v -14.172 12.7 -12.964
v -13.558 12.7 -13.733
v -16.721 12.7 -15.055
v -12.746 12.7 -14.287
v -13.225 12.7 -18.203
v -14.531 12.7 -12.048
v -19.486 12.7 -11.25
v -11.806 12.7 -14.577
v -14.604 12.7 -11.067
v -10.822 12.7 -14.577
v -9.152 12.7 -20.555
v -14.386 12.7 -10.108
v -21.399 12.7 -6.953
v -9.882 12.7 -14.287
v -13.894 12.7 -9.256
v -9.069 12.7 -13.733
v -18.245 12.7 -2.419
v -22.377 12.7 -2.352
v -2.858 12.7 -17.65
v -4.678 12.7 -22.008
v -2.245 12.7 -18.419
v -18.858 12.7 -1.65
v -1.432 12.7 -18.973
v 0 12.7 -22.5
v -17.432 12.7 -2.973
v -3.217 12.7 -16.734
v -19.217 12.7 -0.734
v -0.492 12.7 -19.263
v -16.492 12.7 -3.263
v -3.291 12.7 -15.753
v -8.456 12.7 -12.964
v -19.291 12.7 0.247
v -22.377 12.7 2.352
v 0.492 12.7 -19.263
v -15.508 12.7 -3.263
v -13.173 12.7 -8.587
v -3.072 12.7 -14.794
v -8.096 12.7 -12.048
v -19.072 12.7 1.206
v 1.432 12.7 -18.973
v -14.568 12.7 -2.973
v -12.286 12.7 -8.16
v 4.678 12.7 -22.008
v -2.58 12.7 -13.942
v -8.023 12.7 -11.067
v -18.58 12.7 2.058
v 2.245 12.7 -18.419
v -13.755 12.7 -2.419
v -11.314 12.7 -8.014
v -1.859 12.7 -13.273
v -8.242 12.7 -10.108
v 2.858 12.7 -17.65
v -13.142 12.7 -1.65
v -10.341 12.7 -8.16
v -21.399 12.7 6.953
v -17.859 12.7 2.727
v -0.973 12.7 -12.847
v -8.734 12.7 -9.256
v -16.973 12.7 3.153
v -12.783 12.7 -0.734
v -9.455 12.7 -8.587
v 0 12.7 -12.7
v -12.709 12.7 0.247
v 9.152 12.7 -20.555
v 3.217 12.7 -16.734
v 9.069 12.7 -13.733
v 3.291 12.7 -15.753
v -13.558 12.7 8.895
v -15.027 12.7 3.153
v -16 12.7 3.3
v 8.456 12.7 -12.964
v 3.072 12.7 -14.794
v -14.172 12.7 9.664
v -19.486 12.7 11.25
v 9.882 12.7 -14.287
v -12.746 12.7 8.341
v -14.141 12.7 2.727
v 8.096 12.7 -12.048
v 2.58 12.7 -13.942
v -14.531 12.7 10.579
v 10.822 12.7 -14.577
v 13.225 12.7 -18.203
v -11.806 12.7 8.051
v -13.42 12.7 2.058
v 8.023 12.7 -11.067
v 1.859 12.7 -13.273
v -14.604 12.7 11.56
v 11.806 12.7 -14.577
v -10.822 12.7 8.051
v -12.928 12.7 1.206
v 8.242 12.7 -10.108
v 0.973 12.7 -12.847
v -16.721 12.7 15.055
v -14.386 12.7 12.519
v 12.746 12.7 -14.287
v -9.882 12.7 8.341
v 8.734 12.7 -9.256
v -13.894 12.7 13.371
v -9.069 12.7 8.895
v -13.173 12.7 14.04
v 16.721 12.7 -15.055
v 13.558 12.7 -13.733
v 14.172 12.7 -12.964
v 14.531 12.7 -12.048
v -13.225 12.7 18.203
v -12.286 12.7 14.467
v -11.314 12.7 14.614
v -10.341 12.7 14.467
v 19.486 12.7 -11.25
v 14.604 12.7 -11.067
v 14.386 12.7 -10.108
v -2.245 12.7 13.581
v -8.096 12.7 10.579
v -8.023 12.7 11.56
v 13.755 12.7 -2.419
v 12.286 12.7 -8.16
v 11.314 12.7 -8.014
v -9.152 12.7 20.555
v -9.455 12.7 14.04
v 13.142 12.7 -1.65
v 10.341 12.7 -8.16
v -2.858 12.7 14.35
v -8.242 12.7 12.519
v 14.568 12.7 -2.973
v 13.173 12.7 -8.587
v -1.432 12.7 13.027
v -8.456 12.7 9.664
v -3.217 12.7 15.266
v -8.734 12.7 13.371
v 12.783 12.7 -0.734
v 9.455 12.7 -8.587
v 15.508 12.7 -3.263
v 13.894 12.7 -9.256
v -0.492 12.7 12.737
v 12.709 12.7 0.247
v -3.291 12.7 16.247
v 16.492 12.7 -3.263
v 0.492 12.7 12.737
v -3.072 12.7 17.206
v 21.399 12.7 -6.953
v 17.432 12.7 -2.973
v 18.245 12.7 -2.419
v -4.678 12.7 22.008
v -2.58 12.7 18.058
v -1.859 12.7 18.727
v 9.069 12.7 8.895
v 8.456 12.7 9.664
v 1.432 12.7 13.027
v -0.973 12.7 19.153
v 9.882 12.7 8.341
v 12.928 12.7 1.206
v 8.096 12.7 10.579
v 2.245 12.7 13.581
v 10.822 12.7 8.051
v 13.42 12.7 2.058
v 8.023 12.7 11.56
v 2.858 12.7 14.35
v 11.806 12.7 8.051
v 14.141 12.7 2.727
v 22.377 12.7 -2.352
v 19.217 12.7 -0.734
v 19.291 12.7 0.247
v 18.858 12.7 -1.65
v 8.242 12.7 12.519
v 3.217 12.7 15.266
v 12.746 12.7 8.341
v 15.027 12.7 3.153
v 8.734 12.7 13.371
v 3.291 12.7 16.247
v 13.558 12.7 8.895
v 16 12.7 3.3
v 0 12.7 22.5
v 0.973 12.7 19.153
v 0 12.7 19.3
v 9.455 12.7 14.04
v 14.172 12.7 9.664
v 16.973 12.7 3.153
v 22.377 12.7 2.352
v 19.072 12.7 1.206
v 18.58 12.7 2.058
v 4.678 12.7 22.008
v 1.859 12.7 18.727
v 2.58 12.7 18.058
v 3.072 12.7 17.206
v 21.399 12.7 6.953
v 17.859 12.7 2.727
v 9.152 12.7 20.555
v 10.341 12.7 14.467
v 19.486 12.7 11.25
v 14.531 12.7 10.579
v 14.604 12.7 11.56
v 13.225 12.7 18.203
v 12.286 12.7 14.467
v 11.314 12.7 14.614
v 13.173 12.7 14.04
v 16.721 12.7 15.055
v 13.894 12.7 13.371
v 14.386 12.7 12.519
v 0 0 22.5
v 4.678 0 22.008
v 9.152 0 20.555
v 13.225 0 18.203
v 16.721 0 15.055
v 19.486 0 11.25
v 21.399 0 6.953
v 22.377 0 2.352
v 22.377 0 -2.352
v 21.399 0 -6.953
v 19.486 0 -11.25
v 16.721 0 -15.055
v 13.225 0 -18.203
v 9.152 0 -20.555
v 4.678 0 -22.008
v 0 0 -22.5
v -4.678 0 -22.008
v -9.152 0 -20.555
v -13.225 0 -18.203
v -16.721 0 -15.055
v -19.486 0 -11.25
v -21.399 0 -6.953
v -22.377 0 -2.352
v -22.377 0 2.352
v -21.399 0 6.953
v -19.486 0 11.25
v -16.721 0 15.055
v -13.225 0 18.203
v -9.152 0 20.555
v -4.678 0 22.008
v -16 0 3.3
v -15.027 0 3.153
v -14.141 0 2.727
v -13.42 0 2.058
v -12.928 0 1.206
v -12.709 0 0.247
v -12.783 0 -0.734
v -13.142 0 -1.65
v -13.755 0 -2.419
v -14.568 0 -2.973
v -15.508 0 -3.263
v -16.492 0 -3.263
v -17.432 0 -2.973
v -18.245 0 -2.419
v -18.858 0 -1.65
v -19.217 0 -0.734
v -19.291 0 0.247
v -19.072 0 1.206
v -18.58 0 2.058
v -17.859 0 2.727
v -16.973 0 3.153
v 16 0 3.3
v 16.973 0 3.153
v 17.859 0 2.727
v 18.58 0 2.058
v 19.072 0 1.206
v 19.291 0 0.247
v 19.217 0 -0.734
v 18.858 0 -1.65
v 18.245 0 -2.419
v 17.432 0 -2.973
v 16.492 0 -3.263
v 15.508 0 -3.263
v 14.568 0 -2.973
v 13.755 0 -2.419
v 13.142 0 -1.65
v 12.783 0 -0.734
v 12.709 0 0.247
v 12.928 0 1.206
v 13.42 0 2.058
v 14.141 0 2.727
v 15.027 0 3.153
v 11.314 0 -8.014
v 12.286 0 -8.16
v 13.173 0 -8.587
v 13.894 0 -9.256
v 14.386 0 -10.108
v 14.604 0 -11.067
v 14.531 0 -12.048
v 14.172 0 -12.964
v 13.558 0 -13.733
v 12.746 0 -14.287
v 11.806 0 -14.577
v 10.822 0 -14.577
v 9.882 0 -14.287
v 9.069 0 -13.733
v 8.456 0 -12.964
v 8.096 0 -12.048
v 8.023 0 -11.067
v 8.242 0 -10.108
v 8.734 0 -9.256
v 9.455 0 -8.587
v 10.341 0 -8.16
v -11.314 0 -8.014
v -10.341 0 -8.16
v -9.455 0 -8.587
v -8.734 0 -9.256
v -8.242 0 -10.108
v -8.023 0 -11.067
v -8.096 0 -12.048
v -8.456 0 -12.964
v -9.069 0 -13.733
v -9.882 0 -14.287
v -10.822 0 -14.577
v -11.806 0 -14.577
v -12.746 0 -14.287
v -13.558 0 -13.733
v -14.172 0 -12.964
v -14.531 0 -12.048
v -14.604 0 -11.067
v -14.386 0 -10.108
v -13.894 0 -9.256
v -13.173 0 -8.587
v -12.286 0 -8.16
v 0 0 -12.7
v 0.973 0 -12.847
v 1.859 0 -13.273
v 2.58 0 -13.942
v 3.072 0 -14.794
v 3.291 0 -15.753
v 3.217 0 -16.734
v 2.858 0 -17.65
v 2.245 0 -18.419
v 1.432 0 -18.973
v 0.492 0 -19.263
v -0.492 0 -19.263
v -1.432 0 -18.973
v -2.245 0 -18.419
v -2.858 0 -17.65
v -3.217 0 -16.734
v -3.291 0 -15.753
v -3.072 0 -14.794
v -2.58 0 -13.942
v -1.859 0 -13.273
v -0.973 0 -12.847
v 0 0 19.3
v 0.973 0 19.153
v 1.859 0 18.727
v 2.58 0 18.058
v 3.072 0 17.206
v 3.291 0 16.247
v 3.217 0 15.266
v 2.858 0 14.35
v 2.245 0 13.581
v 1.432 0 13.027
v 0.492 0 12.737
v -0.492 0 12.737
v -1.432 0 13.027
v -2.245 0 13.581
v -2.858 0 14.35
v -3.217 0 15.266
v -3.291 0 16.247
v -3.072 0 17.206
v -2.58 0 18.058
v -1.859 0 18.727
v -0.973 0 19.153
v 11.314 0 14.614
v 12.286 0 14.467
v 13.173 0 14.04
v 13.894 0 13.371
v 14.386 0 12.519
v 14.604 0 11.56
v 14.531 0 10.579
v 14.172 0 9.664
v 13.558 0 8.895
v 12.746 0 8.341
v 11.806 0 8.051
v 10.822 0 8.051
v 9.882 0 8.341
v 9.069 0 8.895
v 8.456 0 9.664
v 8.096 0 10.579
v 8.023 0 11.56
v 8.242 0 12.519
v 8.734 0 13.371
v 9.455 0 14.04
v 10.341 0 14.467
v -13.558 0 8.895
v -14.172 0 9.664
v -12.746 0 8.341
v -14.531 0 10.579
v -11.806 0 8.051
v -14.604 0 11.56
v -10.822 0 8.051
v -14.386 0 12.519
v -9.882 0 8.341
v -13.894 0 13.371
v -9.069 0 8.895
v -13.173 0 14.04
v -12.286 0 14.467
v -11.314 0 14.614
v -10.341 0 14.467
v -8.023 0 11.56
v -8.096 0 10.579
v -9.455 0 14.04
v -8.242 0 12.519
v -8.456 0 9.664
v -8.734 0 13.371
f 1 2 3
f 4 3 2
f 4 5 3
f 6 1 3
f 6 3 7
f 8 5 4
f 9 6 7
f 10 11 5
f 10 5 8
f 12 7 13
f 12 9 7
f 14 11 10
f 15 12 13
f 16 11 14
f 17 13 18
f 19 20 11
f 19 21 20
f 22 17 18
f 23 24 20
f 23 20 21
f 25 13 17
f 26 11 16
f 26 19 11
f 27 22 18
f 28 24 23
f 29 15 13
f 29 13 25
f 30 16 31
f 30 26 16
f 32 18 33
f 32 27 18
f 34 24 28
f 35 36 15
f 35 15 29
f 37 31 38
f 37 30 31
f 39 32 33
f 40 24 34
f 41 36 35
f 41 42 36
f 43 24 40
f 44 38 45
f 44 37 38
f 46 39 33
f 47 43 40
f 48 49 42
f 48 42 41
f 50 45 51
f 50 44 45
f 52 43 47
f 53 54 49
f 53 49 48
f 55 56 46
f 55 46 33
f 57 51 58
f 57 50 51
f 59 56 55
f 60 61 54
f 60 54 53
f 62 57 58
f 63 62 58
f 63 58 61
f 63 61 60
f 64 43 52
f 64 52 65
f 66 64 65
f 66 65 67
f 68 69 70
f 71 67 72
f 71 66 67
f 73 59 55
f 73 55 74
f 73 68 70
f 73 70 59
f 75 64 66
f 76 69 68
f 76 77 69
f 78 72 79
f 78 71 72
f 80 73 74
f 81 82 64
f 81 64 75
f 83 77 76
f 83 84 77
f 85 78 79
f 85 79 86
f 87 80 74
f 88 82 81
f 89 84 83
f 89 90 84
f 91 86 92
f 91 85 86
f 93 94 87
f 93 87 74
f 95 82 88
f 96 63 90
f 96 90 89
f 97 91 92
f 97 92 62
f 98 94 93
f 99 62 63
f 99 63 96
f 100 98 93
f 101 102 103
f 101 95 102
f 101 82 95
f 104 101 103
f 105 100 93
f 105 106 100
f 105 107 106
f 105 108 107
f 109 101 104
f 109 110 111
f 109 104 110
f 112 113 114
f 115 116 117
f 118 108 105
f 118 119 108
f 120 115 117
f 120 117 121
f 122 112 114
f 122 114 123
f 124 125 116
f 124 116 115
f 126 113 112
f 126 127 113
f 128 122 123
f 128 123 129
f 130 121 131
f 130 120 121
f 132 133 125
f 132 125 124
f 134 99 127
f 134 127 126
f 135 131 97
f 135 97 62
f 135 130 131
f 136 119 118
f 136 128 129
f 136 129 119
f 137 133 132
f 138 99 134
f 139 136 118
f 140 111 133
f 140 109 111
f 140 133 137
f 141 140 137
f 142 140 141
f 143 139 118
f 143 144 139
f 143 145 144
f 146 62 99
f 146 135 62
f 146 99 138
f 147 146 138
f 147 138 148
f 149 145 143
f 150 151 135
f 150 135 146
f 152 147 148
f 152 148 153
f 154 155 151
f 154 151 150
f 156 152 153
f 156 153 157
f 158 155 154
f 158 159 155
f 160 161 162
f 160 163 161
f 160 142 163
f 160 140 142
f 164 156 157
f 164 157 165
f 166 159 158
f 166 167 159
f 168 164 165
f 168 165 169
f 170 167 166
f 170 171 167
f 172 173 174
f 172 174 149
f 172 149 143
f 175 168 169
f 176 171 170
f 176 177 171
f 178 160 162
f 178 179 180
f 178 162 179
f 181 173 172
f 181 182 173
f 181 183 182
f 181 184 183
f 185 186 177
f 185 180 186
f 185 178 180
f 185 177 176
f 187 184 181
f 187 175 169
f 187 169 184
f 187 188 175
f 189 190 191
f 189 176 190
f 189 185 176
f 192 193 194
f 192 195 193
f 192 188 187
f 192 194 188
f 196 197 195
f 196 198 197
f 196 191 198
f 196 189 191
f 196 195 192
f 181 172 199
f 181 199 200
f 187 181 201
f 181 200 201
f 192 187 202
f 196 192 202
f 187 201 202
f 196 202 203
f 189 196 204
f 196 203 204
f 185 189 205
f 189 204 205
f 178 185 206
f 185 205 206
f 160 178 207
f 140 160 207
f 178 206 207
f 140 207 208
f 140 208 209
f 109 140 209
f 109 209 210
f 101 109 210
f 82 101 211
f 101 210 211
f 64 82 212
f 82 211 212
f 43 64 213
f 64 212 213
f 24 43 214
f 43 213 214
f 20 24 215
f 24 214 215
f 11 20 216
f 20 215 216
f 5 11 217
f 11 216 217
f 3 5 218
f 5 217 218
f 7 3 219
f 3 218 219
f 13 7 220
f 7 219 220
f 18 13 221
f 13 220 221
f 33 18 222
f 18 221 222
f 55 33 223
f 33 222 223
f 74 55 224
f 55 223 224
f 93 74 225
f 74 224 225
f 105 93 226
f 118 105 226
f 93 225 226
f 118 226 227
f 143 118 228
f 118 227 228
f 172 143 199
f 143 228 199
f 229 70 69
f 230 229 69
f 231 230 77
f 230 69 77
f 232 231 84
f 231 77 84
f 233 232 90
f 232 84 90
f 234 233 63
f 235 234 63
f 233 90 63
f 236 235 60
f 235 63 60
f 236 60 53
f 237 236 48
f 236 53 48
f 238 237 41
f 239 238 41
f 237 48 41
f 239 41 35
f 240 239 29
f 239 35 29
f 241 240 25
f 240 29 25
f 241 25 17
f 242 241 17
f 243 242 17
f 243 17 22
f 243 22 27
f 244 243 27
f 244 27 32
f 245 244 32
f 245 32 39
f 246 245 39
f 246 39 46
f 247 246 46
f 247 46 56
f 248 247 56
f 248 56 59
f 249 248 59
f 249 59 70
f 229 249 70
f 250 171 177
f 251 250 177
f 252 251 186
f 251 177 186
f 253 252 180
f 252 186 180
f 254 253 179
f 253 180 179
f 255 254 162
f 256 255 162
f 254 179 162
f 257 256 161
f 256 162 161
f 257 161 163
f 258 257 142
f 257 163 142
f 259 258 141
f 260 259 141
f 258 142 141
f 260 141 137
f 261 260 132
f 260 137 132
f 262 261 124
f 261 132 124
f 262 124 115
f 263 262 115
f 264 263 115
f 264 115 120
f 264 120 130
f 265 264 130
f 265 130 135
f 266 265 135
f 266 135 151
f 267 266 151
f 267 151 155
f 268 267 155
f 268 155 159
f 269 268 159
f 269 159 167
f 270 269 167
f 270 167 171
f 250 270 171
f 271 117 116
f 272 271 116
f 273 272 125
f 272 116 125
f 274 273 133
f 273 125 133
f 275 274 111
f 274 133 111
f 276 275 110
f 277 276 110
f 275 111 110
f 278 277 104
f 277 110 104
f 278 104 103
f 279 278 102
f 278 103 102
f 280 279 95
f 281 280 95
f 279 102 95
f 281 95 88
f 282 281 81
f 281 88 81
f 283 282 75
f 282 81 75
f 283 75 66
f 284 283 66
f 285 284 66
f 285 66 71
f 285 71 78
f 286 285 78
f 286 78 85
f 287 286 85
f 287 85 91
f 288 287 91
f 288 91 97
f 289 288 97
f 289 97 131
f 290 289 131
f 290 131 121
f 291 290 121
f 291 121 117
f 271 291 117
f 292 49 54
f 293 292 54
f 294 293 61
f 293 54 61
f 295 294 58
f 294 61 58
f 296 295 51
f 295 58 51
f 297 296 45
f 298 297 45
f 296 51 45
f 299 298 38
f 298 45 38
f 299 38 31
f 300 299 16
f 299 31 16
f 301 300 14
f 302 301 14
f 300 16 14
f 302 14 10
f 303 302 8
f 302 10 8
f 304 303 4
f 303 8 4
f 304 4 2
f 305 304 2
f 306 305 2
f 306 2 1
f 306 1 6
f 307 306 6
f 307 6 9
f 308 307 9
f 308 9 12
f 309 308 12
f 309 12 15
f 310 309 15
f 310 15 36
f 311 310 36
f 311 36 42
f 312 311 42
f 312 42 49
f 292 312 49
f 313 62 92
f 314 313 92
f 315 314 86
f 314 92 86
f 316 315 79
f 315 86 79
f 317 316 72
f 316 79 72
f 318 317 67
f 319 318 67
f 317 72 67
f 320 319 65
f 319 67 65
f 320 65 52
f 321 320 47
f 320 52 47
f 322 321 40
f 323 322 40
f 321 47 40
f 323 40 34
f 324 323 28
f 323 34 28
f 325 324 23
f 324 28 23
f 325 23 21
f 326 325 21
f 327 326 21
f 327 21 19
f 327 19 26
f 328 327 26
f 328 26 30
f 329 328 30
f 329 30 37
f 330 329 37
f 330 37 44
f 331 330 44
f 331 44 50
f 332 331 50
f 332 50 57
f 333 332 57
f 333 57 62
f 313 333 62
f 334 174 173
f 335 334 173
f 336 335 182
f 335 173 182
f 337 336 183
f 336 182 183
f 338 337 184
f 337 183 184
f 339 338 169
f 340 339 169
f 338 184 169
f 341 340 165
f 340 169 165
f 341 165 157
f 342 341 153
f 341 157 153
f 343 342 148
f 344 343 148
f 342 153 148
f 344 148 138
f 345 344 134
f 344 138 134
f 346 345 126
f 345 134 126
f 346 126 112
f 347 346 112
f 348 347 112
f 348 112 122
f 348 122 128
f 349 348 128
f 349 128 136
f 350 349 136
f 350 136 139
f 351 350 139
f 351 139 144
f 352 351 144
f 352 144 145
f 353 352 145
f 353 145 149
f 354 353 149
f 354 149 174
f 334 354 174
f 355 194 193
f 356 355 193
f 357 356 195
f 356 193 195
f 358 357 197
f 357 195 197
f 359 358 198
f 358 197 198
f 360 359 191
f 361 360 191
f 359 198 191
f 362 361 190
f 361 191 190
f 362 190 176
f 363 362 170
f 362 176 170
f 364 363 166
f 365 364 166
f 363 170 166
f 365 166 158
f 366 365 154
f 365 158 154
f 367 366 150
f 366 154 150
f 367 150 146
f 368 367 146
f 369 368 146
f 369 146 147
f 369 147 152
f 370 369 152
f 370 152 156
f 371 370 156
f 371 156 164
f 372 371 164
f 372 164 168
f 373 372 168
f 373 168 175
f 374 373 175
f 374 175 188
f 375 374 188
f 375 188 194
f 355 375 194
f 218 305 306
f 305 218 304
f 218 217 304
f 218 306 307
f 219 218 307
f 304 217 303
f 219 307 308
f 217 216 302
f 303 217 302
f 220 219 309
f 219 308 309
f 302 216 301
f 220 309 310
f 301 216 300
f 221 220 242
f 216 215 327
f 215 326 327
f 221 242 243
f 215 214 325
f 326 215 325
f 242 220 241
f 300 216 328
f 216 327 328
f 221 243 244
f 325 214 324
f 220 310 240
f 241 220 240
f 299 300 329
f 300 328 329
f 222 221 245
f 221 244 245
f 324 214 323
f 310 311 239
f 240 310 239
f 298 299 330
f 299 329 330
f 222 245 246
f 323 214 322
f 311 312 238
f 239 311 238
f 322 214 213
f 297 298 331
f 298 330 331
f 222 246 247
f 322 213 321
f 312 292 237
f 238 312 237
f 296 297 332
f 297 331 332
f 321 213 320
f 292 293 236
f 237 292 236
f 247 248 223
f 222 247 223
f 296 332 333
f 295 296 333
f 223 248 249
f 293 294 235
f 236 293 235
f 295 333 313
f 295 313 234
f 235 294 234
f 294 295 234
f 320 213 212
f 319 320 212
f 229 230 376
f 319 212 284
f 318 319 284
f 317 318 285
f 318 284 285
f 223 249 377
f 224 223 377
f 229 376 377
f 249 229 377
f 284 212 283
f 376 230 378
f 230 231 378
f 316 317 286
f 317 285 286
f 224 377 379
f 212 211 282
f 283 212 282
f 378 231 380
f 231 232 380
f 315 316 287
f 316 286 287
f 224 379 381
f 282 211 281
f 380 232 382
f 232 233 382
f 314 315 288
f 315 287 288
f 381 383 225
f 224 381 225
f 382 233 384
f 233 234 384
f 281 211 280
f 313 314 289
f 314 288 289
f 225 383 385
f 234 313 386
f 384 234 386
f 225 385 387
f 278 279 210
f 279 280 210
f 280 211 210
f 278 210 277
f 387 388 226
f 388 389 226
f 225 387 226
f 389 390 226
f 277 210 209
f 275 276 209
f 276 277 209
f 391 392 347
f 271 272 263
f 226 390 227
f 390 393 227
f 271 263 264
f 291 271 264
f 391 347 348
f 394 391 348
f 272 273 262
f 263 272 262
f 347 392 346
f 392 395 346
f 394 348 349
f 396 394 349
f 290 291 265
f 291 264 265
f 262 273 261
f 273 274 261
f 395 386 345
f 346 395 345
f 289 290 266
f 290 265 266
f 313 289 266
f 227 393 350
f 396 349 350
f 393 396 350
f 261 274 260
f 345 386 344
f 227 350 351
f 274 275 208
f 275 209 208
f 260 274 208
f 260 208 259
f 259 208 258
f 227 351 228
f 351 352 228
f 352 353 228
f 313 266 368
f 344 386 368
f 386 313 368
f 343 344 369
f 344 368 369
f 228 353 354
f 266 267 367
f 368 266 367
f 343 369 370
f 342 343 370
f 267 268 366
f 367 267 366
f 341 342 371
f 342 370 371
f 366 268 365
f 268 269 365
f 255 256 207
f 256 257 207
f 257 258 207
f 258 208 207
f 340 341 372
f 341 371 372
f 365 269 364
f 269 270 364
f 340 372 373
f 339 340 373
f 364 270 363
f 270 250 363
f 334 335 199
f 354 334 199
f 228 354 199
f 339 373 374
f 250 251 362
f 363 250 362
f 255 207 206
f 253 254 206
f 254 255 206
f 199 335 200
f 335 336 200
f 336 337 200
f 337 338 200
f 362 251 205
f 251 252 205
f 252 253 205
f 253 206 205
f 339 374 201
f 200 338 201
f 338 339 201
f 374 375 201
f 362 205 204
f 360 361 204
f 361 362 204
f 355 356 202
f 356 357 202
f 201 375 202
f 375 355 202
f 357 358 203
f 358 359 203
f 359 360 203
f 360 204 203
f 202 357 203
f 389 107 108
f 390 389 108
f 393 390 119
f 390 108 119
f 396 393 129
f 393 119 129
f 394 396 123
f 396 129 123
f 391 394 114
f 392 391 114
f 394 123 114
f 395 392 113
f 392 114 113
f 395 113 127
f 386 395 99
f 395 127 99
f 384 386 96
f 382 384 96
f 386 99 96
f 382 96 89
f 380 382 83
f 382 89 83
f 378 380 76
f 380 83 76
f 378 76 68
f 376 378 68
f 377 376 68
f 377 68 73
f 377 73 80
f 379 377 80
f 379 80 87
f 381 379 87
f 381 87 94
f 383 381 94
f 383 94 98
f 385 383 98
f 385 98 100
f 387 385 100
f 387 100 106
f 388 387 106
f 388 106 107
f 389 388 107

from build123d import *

# Parameters (mm, degrees)
SKETCH1_R           = 22.5
BOSS_EXTRUDE1_DEPTH = 12.7
SKETCH2_R           = 3.3
CUT_EXTRUDE1_DEPTH  = 35.260618792


with BuildPart() as part:
    # Sketch1 → Boss-Extrude1 (new body)
    with BuildSketch(Plane(origin=(0, 0, 0), x_dir=(1, 0, 0), z_dir=(0, 1, 0))):
        with Locations(Location((0, 0, 0), (0, 0, 270))):
            Circle(SKETCH1_R)
    extrude(amount=BOSS_EXTRUDE1_DEPTH)

    # Sketch2 → Cut-Extrude1 (cut, through all)
    with BuildSketch(Plane(origin=(0, 12.7, 0), x_dir=(1, 0, 0), z_dir=(0, 1, 0))):
        with Locations(Location((-16, 0, 0), (0, 0, 270))):
            Circle(SKETCH2_R)
        with Locations(Location((-11.313708499, 11.313708499, 0), (0, 0, 270))):
            Circle(SKETCH2_R)
        with Locations(Location((0, 16, 0), (0, 0, 270))):
            Circle(SKETCH2_R)
        with Locations(Location((11.313708499, 11.313708499, 0), (0, 0, 270))):
            Circle(SKETCH2_R)
        with Locations(Location((16, 0, 0), (0, 0, 270))):
            Circle(SKETCH2_R)
        with Locations(Location((11.313708499, -11.313708499, 0), (0, 0, 270))):
            Circle(SKETCH2_R)
        with Locations(Location((0, -16, 0), (0, 0, 270))):
            Circle(SKETCH2_R)
        with Locations(Location((-11.313708499, -11.313708499, 0), (0, 0, 270))):
            Circle(SKETCH2_R)
    extrude(amount=-CUT_EXTRUDE1_DEPTH, mode=Mode.SUBTRACT)


solid = part.part
